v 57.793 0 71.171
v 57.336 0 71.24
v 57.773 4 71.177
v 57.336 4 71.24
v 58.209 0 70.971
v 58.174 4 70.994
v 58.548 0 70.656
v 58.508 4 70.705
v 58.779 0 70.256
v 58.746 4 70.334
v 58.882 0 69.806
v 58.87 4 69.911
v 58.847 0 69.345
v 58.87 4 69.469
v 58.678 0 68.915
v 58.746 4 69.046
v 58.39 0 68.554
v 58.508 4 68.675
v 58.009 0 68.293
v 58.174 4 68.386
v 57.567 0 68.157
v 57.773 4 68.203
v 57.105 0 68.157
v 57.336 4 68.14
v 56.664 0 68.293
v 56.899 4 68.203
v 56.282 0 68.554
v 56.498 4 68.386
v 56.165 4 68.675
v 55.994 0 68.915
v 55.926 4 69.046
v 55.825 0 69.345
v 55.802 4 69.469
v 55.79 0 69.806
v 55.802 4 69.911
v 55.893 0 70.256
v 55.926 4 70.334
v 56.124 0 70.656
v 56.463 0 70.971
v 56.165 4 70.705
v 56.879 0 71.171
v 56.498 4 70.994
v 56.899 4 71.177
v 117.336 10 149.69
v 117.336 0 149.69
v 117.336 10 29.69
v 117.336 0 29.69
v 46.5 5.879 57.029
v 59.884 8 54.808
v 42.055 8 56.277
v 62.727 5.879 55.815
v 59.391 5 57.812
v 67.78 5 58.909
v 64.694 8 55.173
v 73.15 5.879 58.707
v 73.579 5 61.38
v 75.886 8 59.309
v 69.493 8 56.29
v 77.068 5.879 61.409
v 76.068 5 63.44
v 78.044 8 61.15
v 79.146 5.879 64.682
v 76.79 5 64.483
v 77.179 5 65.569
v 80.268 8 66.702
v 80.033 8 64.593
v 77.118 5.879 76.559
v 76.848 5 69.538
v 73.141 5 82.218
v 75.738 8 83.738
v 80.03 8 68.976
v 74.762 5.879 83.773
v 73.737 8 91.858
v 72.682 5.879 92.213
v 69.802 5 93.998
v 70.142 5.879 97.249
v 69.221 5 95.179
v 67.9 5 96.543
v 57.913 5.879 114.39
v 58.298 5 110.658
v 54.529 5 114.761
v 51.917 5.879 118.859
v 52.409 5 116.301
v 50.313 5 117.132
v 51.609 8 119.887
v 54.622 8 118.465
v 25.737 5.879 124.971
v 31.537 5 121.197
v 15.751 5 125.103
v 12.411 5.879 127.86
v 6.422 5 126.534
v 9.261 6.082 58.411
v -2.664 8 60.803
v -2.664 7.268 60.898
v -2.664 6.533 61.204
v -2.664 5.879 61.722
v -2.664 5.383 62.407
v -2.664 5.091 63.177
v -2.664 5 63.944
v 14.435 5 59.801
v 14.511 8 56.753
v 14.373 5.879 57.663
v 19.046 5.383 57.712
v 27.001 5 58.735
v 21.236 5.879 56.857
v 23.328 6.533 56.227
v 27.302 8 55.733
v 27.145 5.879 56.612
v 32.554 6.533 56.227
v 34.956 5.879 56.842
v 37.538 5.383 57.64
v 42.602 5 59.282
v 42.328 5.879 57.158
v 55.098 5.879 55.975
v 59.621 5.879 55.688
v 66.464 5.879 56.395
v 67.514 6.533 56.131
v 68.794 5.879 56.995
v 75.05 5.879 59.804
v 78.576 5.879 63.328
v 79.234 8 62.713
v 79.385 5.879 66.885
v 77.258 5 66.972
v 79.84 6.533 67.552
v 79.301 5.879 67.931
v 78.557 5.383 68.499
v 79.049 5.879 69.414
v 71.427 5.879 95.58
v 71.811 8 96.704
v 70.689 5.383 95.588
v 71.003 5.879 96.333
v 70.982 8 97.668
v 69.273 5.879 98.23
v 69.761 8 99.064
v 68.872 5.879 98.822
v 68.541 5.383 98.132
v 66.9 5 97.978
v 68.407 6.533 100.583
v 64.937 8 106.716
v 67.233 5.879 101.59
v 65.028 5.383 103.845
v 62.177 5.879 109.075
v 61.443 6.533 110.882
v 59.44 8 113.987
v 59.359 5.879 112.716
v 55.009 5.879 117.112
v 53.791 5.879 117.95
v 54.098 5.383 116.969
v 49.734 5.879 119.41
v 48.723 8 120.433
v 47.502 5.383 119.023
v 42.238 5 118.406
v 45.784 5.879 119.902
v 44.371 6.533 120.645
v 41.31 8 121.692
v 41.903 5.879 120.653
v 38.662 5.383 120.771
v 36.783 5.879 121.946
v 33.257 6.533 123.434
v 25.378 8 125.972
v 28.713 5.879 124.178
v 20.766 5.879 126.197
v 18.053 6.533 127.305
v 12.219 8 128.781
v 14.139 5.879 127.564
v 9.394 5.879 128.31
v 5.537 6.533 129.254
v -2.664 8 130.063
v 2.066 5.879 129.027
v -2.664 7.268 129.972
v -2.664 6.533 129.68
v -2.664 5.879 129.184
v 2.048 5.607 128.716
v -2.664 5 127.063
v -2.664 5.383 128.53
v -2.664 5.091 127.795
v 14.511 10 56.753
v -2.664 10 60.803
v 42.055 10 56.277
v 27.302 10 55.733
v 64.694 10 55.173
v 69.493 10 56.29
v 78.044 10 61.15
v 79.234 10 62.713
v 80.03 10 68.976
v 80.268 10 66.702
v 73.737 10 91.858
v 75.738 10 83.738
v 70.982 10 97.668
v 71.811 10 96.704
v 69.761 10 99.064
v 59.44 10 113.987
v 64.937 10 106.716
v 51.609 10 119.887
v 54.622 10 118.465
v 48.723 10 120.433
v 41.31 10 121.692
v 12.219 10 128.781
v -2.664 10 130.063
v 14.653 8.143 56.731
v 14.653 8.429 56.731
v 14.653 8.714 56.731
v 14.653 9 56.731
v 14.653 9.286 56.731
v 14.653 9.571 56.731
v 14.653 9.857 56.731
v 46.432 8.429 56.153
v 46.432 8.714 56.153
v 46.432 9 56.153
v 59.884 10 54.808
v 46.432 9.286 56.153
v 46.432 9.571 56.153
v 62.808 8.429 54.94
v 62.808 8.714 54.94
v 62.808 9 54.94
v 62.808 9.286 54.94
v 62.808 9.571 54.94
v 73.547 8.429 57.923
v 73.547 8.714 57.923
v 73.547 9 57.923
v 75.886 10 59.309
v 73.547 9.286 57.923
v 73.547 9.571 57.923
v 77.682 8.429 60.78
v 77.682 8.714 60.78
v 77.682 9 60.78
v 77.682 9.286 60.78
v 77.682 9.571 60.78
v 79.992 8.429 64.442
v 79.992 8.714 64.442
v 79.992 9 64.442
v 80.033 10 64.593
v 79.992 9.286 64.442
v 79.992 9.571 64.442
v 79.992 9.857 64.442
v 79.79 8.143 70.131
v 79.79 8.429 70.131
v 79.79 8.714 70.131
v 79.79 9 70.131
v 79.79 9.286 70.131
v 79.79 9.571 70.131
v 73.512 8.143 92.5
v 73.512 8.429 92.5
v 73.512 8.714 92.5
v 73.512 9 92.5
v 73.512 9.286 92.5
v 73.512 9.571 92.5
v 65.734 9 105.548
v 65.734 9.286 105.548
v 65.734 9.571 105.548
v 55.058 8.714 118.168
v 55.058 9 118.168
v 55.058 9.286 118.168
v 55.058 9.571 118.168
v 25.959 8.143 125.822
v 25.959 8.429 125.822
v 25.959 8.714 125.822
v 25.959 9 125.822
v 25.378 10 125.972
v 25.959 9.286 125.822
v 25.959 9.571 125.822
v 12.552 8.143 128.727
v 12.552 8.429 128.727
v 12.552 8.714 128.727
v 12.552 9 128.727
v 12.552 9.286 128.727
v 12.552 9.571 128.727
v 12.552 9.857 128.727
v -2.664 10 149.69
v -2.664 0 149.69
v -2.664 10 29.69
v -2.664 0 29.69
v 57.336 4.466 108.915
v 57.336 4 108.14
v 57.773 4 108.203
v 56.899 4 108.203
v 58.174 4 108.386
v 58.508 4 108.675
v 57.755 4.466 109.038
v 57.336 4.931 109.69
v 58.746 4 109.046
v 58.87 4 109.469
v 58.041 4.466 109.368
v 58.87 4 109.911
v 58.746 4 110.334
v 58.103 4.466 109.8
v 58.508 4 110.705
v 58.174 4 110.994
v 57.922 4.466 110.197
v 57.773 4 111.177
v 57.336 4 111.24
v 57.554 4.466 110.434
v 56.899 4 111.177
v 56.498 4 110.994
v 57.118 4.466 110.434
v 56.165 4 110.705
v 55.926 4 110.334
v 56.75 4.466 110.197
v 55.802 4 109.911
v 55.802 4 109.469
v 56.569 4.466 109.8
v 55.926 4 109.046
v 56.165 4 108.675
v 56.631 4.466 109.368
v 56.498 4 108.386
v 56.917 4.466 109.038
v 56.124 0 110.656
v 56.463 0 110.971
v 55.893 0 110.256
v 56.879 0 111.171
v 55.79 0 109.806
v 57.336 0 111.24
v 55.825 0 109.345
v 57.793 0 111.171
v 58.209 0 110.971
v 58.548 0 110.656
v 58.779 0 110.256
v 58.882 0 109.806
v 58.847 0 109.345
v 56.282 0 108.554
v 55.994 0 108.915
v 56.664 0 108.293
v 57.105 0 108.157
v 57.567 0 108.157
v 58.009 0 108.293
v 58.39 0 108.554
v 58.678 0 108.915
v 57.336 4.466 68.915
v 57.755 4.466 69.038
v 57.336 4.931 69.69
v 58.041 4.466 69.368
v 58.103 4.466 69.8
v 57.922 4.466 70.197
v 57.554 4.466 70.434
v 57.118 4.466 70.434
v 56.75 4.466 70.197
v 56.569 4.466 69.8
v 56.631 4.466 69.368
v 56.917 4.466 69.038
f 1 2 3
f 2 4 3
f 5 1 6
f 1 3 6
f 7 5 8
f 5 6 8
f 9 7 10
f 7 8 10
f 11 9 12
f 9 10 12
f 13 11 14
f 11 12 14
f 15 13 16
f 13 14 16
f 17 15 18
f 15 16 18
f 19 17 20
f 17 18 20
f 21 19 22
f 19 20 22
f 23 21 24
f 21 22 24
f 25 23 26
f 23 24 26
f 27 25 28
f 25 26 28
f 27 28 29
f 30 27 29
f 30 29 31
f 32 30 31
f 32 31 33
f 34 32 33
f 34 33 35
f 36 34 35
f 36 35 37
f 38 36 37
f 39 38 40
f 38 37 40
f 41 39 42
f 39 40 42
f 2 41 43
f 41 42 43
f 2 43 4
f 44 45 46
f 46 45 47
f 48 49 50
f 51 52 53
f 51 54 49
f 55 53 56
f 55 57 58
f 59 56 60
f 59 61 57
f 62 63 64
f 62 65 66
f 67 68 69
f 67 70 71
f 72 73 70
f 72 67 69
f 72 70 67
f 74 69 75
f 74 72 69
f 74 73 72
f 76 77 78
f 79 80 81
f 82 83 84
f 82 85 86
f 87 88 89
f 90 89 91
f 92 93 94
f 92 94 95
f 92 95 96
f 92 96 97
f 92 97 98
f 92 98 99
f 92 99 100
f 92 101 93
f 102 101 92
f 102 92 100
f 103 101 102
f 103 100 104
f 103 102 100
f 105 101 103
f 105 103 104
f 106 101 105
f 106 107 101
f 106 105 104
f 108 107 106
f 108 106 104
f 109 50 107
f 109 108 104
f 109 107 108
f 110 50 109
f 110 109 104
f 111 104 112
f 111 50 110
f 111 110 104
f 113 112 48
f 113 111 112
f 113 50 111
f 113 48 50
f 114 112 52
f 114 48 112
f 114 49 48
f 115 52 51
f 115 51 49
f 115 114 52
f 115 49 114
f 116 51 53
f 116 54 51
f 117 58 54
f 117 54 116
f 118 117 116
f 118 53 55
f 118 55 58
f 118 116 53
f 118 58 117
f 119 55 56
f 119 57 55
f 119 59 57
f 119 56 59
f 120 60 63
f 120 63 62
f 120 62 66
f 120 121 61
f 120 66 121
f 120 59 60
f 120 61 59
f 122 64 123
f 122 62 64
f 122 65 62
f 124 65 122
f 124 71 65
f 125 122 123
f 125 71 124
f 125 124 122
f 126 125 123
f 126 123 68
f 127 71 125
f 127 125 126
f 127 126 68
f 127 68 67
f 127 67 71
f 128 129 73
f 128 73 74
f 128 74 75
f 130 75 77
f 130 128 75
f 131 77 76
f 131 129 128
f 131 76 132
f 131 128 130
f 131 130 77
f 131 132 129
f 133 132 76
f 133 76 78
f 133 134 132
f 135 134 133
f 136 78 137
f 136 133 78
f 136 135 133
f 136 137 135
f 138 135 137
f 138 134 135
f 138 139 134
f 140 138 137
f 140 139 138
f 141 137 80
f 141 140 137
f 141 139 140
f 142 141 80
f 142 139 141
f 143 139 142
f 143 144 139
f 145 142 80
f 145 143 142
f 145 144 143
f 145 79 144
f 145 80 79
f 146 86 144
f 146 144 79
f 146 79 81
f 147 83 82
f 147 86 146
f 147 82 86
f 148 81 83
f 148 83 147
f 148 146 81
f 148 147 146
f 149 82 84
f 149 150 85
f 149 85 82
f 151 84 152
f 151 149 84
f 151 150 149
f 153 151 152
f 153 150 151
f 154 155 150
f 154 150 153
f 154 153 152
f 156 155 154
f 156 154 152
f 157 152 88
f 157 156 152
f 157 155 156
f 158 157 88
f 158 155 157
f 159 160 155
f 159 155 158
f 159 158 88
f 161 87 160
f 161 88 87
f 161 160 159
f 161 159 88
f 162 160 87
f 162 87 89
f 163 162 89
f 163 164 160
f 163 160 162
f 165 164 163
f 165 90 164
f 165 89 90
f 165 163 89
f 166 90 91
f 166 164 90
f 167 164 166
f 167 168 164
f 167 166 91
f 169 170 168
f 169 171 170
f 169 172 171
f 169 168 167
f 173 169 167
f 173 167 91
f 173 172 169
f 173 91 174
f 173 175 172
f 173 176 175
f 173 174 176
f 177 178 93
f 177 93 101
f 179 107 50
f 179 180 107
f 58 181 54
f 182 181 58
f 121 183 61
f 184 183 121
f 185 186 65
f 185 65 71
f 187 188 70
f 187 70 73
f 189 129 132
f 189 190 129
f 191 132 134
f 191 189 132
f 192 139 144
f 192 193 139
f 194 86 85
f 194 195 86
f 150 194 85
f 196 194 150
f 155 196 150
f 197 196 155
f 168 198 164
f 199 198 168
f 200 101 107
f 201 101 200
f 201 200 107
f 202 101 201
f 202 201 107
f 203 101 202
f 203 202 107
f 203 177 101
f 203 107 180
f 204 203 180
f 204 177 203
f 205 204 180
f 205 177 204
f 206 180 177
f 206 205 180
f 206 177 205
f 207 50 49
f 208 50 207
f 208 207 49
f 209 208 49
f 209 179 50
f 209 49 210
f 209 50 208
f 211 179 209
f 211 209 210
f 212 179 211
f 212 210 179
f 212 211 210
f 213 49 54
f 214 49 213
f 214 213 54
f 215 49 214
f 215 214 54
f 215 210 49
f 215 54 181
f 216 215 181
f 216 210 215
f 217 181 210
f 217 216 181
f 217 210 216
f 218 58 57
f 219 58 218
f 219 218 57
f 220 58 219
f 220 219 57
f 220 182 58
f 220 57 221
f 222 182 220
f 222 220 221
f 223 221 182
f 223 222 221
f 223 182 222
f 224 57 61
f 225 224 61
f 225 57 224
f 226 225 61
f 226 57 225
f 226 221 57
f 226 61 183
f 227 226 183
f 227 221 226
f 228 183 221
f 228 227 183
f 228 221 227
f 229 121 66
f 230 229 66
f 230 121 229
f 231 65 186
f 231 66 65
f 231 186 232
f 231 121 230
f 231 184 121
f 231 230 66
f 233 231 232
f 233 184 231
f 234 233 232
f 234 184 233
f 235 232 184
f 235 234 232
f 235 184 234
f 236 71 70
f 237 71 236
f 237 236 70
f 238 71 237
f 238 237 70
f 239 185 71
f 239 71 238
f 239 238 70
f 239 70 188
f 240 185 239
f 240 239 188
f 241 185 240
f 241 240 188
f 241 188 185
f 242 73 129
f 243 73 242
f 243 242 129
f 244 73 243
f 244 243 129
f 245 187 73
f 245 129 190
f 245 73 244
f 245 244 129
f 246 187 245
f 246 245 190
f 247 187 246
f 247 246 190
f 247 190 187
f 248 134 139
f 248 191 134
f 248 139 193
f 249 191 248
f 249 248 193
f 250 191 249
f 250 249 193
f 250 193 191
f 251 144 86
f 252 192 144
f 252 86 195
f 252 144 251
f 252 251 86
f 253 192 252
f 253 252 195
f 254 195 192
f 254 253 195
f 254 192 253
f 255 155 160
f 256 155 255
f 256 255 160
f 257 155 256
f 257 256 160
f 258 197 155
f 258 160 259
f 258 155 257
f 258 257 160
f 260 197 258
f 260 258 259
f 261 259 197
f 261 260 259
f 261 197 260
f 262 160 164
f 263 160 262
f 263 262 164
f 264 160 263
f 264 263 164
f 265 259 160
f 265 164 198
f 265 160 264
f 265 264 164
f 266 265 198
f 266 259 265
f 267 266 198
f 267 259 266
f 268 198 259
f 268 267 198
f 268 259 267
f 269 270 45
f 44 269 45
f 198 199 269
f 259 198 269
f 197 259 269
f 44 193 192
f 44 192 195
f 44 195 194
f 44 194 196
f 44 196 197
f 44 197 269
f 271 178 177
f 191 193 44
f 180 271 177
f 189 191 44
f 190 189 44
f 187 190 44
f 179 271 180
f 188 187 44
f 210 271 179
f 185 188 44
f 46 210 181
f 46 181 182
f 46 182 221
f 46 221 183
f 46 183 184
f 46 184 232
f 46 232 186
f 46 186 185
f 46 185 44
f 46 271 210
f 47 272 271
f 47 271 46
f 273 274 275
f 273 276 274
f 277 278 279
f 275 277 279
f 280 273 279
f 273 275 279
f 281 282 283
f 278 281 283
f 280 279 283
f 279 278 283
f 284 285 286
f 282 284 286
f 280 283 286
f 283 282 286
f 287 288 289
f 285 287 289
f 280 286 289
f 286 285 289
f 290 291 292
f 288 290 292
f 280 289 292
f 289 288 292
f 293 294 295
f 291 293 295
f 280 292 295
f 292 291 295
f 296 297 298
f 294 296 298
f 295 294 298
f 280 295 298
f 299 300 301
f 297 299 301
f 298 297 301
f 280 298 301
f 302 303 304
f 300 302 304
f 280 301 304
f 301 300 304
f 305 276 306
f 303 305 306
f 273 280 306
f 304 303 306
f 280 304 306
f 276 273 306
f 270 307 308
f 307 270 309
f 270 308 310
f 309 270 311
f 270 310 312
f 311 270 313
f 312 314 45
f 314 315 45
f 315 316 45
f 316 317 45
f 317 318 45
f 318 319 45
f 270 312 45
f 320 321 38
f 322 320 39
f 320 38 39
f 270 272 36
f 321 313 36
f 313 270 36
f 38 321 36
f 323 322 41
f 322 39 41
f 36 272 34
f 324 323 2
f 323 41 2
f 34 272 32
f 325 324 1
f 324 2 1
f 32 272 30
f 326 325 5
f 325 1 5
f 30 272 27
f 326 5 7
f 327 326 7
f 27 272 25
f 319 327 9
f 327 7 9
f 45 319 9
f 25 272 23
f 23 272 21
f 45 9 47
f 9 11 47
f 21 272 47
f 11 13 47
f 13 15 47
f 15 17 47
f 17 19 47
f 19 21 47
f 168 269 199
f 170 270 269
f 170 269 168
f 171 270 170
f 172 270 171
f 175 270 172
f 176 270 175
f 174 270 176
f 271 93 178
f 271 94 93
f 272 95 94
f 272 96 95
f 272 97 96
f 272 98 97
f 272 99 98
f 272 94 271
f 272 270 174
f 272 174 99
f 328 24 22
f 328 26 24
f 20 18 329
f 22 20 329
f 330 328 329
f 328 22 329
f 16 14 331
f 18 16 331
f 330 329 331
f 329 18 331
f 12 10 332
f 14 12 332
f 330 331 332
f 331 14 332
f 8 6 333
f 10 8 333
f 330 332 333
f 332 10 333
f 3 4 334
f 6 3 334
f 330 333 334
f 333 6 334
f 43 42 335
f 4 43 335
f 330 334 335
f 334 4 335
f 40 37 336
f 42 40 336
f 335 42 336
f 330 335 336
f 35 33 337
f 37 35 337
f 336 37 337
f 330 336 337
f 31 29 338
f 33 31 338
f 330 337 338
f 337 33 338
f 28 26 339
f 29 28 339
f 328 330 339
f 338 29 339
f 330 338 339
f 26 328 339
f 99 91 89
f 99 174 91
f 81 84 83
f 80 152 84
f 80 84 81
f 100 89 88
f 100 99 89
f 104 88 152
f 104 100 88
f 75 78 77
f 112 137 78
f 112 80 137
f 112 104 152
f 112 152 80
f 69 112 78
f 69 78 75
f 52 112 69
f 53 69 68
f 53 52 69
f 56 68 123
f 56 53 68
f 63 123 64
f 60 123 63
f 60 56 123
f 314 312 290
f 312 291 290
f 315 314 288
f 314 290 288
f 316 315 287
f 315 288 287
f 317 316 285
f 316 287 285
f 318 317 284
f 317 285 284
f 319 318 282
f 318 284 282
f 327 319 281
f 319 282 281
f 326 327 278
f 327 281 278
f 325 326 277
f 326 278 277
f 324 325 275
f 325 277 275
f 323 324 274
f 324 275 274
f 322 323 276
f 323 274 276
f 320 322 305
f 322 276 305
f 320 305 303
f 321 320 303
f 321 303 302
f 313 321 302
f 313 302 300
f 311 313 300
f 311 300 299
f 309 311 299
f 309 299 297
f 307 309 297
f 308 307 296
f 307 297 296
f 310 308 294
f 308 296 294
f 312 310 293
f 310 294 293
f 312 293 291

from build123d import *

# Parameters (mm, degrees)
SCHIZZO2_W                   = 120
SCHIZZO2_H                   = 120
ESTRUSIONE_ESTRUSIONE2_DEPTH = 10
FORO_PER_VITE_M2_5_2_D       = 3.1
FORO_PER_VITE_M2_5_2_DEPTH   = 4
FORO_PER_VITE_M2_5_2_TIP     = 0.931333959
TAGLIO_ESTRUSIONE1_DEPTH     = 5
RACCORDO1_R                  = 3


with BuildPart() as part:
    # Schizzo2 → Estrusione-Estrusione2 (new body)
    with BuildSketch(Plane(origin=(0, 0, 0), x_dir=(1, 0, 0), z_dir=(0, 1, 0))):
        with Locations((57.336140445, -89.689917766)):
            Rectangle(SCHIZZO2_W, SCHIZZO2_H)
    extrude(amount=ESTRUSIONE_ESTRUSIONE2_DEPTH)

    # Foro per Vite M2.5-2
    with Locations(Plane(origin=(57.336140445, 0, 69.689917766), x_dir=(0, 0, -1), z_dir=(0, -1, 0))):
        with Locations((0, 0), (-40, 0)):
            Hole(FORO_PER_VITE_M2_5_2_D / 2, depth=FORO_PER_VITE_M2_5_2_DEPTH)
            with Locations((0, 0, -(FORO_PER_VITE_M2_5_2_DEPTH + FORO_PER_VITE_M2_5_2_TIP / 2))):  # 118° drill point
                Cone(0, FORO_PER_VITE_M2_5_2_D / 2, FORO_PER_VITE_M2_5_2_TIP, mode=Mode.SUBTRACT)

    # Schizzo10 → Taglio-Estrusione1 (cut)
    with BuildSketch(Plane(origin=(0, 10, 0), x_dir=(1, 0, 0), z_dir=(0, 1, 0))):
        with BuildLine():
            Line((-2.663859555, -60.802596799), (-2.663859555, -130.063136574))
            add(Edge.make_bspline(
                [(-2.663859555, -60.802596799), (24.120458808, -52.569954294), (39.186624842, -58.989375392), (63.038306723, -52.725855782), (83.808423835, -61.253409566), (78.352880408, -73.941492055), (76.969845115, -81.425430824), (75.06672503, -84.958843946), (74.867241782, -88.836485772), (73.337118961, -92.829619198), (72.180976636, -96.649123539), (69.344468912, -99.046734159), (69.335451288, -100.716029068), (55.064188681, -120.559334241), (41.363004275, -119.412240667), (18.774542286, -129.920141134), (-2.663859555, -130.063136574)],
                knots=[0, 0, 0, 0, 0.23082752, 0.329751683, 0.448049595, 0.523336191, 0.556692415, 0.56273154, 0.583727435, 0.6089427, 0.641848116, 0.652121656, 0.711678095, 0.742832598, 0.807026375, 1, 1, 1, 1], degree=3))
        make_face()
    extrude(amount=-TAGLIO_ESTRUSIONE1_DEPTH, mode=Mode.SUBTRACT)

    # Raccordo1
    raccordo1_edges = [part.edges().sort_by_distance(p)[0] for p in [
        (76.957515661, 5, 80.743306594),
    ]]
    fillet(raccordo1_edges, radius=RACCORDO1_R)


solid = part.part
